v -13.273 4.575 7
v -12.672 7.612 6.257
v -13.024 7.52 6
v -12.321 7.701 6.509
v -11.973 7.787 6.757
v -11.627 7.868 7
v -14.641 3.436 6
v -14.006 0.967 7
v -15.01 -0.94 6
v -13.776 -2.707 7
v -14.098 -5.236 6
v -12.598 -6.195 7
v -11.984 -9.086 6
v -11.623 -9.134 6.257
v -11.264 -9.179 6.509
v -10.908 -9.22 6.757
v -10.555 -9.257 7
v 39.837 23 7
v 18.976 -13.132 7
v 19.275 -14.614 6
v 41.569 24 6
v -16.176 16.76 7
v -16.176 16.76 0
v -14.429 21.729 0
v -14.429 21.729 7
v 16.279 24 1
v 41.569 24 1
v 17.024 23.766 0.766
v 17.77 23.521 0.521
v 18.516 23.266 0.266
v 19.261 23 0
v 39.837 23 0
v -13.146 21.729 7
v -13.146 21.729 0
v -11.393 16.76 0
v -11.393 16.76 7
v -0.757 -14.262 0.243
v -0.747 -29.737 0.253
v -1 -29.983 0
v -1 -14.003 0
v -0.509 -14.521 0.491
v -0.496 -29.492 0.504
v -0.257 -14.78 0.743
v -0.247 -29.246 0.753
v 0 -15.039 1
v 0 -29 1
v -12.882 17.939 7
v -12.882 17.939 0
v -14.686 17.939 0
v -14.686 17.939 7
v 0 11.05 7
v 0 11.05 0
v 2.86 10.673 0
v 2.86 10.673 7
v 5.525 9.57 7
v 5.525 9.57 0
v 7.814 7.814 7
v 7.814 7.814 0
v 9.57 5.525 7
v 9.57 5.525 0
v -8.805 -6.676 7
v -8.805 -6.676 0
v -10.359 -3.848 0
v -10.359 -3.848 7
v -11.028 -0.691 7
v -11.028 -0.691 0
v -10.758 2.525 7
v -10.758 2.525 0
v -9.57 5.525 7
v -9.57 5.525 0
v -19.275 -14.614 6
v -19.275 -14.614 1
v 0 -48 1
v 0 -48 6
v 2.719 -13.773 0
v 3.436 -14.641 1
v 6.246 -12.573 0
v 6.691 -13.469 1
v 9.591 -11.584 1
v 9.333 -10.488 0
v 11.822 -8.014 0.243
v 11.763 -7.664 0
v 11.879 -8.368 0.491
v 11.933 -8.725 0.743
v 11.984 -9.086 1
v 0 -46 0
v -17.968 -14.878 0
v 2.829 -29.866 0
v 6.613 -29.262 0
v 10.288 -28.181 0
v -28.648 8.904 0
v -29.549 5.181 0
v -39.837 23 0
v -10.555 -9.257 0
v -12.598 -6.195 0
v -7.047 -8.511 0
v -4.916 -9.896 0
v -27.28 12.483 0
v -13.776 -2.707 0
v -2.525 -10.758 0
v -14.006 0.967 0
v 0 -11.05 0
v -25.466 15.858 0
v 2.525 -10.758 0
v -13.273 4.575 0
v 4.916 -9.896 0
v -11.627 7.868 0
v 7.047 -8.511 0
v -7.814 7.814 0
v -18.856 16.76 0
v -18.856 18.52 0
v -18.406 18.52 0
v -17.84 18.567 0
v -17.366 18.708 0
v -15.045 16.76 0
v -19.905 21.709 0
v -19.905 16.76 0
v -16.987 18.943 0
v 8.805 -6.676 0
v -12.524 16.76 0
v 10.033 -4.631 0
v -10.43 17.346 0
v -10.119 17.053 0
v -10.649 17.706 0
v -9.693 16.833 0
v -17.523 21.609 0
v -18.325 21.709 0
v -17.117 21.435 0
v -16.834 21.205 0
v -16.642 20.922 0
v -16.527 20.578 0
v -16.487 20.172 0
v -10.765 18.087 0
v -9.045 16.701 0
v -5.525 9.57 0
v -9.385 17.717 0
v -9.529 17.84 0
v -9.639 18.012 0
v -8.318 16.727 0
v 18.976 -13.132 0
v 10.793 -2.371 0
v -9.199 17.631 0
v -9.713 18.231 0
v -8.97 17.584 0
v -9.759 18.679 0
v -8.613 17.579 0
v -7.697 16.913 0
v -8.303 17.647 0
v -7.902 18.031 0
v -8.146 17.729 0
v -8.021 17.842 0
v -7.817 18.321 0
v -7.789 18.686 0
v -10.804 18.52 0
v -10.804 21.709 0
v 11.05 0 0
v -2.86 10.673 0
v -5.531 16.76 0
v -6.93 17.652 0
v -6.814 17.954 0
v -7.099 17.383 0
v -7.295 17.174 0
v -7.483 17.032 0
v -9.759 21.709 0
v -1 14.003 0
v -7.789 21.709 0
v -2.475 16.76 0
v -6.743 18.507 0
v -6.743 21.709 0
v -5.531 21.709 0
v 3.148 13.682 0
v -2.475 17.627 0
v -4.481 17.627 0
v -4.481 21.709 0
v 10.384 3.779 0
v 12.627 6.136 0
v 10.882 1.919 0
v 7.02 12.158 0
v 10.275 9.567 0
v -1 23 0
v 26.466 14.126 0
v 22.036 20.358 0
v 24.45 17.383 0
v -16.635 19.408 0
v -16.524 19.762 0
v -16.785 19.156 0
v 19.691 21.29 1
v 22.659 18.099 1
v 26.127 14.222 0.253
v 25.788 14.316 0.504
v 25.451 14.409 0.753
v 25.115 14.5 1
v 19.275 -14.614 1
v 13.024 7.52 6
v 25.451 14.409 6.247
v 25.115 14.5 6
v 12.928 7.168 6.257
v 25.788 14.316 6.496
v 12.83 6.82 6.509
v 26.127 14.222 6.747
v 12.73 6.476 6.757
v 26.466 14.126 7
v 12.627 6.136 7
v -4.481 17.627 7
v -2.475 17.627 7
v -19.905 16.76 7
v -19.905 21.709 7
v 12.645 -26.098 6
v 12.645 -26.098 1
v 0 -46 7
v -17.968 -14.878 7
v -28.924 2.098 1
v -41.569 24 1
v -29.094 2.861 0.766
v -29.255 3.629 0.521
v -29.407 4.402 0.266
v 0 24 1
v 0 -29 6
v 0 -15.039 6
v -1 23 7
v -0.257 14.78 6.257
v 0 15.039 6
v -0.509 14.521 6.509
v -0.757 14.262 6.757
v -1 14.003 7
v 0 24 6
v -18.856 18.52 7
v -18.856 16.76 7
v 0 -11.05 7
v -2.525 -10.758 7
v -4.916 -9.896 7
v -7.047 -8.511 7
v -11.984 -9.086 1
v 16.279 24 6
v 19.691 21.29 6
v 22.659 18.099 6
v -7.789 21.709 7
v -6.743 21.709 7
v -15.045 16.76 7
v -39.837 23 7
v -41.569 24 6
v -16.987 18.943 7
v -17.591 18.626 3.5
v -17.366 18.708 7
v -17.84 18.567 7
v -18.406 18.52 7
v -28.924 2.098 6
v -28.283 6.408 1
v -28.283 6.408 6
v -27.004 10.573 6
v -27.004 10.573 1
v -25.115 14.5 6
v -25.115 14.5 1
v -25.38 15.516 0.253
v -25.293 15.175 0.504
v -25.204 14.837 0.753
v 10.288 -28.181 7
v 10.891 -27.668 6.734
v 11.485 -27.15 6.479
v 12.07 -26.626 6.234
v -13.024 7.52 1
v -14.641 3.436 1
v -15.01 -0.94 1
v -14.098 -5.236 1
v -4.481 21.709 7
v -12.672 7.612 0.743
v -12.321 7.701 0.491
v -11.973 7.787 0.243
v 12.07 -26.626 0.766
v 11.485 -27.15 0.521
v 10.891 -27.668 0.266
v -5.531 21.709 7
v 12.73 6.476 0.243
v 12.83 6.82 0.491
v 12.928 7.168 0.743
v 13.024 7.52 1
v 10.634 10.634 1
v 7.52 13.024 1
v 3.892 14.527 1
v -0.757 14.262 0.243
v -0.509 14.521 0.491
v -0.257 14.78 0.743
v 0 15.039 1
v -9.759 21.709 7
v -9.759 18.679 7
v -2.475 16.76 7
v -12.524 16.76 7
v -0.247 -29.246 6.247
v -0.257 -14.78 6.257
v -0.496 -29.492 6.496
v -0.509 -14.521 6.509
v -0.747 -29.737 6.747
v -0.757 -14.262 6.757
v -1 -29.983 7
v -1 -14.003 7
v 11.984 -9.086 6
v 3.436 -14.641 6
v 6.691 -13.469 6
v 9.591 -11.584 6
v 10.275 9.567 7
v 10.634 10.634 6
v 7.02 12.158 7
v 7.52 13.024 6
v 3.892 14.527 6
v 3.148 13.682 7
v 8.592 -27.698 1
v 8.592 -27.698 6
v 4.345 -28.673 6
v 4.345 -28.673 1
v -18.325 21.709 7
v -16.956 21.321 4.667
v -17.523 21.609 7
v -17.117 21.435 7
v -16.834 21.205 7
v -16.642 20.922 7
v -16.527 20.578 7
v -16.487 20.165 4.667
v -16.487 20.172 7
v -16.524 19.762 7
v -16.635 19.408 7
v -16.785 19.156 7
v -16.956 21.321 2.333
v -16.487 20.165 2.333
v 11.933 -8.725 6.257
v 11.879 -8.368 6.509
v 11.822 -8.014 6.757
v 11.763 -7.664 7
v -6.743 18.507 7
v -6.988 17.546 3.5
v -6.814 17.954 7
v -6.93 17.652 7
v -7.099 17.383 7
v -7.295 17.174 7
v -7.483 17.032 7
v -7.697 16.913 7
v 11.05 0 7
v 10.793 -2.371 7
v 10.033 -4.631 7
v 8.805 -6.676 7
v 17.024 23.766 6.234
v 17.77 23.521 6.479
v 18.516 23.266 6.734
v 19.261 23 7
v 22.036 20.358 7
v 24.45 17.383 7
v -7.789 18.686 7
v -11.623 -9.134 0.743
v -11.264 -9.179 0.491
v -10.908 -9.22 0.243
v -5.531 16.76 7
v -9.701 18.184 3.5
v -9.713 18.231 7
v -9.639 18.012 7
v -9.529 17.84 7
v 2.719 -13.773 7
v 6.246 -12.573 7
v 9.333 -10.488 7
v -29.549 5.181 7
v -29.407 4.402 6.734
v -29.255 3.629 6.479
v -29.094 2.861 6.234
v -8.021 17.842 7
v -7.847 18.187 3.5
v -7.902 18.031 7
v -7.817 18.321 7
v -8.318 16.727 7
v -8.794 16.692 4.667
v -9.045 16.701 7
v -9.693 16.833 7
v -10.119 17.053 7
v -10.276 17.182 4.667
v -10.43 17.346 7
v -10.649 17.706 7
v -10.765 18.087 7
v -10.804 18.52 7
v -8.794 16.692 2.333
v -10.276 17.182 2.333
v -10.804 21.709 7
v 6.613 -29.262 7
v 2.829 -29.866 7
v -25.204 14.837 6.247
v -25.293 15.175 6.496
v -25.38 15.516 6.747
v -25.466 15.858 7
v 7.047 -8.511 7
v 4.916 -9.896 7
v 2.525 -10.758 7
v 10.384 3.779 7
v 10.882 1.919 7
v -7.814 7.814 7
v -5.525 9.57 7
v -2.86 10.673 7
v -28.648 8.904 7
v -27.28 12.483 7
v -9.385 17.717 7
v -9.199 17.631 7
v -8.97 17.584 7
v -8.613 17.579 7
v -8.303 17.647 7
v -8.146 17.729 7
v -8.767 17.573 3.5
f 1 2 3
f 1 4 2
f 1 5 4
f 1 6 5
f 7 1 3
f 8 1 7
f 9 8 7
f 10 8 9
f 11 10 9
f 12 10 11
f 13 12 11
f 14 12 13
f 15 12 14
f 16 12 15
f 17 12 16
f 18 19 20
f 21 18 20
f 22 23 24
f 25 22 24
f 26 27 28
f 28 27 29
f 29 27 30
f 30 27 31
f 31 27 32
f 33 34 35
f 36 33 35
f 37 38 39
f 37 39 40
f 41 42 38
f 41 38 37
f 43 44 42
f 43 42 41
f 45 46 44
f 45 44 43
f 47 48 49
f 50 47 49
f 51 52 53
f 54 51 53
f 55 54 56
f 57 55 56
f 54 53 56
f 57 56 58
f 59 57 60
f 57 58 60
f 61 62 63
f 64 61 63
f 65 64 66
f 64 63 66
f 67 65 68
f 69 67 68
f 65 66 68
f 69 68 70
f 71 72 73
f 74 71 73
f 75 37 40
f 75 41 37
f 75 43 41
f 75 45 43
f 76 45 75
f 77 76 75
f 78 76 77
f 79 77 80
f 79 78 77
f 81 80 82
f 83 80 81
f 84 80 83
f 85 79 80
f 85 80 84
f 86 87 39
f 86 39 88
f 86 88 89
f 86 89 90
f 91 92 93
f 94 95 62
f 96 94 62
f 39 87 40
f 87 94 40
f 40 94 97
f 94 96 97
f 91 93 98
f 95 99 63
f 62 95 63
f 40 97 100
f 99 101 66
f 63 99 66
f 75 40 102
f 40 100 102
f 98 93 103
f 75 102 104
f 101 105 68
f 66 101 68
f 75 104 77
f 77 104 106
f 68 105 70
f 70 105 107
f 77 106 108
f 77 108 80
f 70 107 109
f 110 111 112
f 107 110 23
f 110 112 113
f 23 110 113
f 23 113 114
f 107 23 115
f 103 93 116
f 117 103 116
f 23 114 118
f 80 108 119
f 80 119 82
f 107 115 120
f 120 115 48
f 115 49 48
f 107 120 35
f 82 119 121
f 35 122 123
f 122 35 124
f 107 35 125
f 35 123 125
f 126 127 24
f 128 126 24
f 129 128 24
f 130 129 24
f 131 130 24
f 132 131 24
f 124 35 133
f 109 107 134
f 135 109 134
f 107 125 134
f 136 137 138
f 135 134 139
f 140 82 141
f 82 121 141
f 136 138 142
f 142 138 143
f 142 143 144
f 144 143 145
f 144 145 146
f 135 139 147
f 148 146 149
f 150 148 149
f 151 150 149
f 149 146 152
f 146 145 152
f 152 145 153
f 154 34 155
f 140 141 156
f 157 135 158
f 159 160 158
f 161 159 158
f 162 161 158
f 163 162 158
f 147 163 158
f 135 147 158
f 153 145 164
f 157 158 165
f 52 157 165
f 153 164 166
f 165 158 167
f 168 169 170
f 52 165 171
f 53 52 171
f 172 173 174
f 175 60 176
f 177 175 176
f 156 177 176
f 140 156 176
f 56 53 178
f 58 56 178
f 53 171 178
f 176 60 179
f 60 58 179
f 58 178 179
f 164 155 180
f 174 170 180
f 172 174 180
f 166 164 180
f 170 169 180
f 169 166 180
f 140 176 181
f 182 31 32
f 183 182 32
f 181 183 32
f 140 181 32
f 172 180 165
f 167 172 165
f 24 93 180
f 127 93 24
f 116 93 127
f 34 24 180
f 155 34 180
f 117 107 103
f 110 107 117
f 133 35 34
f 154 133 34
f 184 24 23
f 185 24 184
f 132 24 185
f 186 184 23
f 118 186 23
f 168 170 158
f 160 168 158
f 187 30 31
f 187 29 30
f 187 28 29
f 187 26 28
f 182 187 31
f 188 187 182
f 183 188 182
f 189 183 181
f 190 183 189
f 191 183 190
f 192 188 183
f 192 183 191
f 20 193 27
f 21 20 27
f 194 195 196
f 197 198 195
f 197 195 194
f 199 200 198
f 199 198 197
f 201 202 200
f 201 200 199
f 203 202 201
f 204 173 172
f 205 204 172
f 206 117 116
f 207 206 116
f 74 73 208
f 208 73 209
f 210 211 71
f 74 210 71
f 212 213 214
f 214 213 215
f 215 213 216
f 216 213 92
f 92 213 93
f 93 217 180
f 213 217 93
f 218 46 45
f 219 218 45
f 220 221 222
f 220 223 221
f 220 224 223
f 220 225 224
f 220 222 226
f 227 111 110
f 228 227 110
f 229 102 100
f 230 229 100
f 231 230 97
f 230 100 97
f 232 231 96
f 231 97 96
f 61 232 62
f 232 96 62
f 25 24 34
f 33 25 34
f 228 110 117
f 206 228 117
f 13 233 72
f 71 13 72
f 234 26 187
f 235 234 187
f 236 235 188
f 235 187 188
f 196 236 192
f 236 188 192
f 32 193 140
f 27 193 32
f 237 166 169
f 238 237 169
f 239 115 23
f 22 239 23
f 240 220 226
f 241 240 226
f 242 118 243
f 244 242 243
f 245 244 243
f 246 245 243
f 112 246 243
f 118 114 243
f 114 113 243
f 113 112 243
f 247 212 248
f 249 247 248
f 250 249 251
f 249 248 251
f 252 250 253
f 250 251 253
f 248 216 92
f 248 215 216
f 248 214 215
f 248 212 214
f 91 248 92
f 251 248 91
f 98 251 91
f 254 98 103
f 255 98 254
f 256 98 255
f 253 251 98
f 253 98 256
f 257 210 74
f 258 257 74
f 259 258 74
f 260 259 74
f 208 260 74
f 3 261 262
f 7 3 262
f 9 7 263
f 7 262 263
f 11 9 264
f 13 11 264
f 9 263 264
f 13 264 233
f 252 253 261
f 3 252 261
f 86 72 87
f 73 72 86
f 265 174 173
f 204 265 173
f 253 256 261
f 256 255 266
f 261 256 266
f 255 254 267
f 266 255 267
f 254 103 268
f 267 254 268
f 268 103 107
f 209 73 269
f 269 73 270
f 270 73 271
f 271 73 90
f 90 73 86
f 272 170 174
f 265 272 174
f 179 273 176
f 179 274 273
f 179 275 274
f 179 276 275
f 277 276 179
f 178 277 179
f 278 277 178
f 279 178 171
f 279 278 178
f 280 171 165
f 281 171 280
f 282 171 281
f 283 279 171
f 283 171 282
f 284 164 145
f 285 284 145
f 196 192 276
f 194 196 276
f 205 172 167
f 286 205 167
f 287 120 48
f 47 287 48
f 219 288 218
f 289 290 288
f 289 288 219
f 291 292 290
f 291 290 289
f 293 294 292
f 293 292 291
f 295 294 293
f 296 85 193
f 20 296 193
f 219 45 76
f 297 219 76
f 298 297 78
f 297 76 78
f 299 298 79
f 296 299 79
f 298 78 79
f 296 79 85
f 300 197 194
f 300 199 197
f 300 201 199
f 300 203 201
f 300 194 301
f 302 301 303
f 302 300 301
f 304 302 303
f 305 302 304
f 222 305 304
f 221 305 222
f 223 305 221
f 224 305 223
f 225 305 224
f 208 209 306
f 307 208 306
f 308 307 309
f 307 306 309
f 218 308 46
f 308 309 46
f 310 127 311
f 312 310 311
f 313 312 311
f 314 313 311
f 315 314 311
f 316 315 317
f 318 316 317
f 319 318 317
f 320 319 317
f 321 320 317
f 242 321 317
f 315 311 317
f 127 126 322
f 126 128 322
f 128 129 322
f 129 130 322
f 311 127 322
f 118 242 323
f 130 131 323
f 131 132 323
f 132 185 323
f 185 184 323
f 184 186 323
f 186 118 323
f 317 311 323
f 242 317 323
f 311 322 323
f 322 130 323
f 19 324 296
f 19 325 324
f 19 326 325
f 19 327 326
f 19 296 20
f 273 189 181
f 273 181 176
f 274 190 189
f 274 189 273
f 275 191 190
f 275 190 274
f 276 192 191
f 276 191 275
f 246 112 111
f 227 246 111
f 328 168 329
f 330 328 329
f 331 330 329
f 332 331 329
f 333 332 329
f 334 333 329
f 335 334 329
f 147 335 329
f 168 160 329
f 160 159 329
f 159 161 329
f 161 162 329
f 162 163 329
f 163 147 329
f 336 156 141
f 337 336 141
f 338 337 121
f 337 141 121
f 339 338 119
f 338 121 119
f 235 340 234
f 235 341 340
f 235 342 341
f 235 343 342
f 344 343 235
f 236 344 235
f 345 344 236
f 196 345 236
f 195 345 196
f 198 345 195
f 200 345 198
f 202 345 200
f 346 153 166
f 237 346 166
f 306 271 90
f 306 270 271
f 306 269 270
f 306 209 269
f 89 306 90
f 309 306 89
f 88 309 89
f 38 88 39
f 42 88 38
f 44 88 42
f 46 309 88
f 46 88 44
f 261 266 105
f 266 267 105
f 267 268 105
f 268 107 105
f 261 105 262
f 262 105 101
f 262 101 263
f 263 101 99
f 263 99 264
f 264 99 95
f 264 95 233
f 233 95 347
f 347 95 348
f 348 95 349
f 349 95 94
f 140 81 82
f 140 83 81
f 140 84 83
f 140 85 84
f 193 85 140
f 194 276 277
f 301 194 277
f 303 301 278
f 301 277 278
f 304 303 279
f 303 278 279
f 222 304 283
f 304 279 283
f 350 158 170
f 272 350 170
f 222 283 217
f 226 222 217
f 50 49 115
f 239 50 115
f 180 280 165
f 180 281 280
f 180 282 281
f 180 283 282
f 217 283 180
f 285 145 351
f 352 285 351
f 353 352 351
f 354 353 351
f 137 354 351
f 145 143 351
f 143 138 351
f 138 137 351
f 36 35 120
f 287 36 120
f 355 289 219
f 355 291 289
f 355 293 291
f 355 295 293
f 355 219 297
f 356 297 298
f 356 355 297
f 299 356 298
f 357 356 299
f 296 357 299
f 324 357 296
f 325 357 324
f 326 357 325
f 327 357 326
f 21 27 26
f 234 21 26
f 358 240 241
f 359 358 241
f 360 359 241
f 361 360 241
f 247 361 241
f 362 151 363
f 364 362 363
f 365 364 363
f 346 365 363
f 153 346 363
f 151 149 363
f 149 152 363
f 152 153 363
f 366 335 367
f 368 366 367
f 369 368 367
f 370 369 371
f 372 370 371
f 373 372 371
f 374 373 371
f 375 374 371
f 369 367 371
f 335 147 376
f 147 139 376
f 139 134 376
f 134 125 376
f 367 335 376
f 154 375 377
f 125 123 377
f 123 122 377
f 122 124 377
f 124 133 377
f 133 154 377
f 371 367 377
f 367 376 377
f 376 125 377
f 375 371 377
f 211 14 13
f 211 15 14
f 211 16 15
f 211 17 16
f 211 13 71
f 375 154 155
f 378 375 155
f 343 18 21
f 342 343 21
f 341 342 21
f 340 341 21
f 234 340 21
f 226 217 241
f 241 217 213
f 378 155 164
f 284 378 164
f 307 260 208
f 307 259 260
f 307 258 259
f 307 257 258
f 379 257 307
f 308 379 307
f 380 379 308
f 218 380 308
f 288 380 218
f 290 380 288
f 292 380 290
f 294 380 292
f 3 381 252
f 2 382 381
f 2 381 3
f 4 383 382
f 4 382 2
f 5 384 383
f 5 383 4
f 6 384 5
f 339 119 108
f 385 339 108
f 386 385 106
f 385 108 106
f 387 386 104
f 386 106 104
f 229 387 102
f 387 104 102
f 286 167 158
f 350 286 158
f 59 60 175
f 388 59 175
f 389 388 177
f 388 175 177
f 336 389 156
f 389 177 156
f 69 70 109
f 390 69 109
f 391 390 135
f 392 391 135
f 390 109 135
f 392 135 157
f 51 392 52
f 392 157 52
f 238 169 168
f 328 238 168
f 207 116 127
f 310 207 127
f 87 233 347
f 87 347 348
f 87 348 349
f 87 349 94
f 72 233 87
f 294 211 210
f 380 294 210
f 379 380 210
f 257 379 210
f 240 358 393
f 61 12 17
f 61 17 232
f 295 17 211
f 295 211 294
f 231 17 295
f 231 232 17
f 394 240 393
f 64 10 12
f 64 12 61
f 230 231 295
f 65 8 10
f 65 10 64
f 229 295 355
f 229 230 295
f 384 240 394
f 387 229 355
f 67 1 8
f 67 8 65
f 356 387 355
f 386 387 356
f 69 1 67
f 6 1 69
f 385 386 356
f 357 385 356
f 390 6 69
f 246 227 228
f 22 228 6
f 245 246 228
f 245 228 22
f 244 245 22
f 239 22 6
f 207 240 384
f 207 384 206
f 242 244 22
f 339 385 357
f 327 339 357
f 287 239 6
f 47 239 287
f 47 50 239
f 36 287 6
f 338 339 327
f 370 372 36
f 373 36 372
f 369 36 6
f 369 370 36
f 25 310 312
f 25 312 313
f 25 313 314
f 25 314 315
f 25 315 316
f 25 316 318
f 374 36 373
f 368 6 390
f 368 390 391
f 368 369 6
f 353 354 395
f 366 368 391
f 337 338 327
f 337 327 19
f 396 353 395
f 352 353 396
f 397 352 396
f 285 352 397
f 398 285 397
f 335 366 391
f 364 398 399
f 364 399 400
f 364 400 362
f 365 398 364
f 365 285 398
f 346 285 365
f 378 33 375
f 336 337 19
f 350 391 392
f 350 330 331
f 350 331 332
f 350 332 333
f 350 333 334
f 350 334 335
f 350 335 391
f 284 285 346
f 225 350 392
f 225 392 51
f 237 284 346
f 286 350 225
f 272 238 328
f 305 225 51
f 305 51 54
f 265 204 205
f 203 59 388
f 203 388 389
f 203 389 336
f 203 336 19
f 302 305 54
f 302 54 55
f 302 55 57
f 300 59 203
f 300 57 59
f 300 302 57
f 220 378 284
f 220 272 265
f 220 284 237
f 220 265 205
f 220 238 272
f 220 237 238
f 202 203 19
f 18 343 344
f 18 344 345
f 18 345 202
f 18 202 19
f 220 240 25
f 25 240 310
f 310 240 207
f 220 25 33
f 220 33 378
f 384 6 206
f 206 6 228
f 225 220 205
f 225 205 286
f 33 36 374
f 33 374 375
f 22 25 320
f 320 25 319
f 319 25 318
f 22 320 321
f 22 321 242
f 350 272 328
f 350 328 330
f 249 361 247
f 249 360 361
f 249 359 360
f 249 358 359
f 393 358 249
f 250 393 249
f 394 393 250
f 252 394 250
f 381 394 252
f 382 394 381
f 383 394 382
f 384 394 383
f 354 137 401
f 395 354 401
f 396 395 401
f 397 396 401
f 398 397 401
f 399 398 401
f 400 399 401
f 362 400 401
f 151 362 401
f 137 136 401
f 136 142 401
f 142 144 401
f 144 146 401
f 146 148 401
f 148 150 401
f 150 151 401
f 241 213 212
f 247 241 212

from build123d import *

# Parameters (mm, degrees)
F1_DEPTH = 7
F2_SIZE  = 1
F3_SIZE  = 1


with BuildPart() as f1:
    # F0 (on Top) → F1 (new body)
    with BuildSketch(Plane.XY):
        with BuildLine():
            ThreePointArc((9.5695807118, 5.525), (10.6734803805, 2.8599504484), (11.05, 0))
            ThreePointArc((11.05, 0), (10.4737971003, -3.5216578911), (8.8052806693, -6.6760416667))
            Line((8.8052806693, -6.6760416667), (11.9840638306, -9.0861509672))
            ThreePointArc((11.9840638306, -9.0861509672), (14.2549292536, -4.7930071218), (15.0391464284, 0))
            ThreePointArc((15.0391464284, 0), (14.5266999405, 3.8924175178), (13.0242828582, 7.5195732142))
            Line((13.0242828582, 7.5195732142), (9.5695807118, 5.525))
        make_face()
        with BuildLine():
            ThreePointArc((0, 11.05), (5.525, 9.5695807118), (9.5695807118, 5.525))
            Line((9.5695807118, 5.525), (13.0242828582, 7.5195732142))
            ThreePointArc((13.0242828582, 7.5195732142), (7.5195732142, 13.0242828582), (0, 15.0391464284))
            Line((0, 15.0391464284), (0, 11.05))
        make_face()
        with BuildLine():
            Line((11.9840638306, -9.0861509672), (8.8052806693, -6.6760416667))
            ThreePointArc((8.8052806693, -6.6760416667), (4.9159047785, -9.8962811302), (0, -11.05))
            Line((0, -11.05), (0, -15.0391464284))
            ThreePointArc((0, -15.0391464284), (6.6905893025, -13.4689249786), (11.9840638306, -9.0861509672))
        make_face()
        with BuildLine():
            ThreePointArc((-9.5695807118, 5.525), (-5.525, 9.5695807118), (0, 11.05))
            Line((0, 11.05), (0, 15.0391464284))
            ThreePointArc((0, 15.0391464284), (-7.5195732142, 13.0242828582), (-13.0242828582, 7.5195732142))
            Line((-13.0242828582, 7.5195732142), (-9.5695807118, 5.525))
        make_face()
        with BuildLine():
            Line((25.1147367097, 14.5), (13.0242828582, 7.5195732142))
            ThreePointArc((13.0242828582, 7.5195732142), (14.5266999405, 3.8924175178), (15.0391464284, 0))
            ThreePointArc((15.0391464284, 0), (14.2549292536, -4.7930071218), (11.9840638306, -9.0861509672))
            Line((11.9840638306, -9.0861509672), (19.2752742891, -14.6142456014))
            Line((19.2752742891, -14.6142456014), (41.5692193817, 24))
            Line((41.5692193817, 24), (16.2788205961, 24))
            ThreePointArc((16.2788205961, 24), (21.2348568775, 19.7504646374), (25.1147367097, 14.5))
        make_face()
        with BuildLine():
            Line((0, -15.0391464284), (0, -11.05))
            ThreePointArc((0, -11.05), (-4.9159047785, -9.8962811302), (-8.8052806693, -6.6760416667))
            Line((-8.8052806693, -6.6760416667), (-11.9840638306, -9.0861509672))
            ThreePointArc((-11.9840638306, -9.0861509672), (-6.6905893025, -13.4689249786), (0, -15.0391464284))
        make_face()
        with BuildLine():
            ThreePointArc((-8.8052806693, -6.6760416667), (-11.028383251, -0.6908421443), (-9.5695807118, 5.525))
            Line((-9.5695807118, 5.525), (-13.0242828582, 7.5195732142))
            ThreePointArc((-13.0242828582, 7.5195732142), (-15.0097258444, -0.9402421871), (-11.9840638306, -9.0861509672))
            Line((-11.9840638306, -9.0861509672), (-8.8052806693, -6.6760416667))
        make_face()
        with BuildLine():
            ThreePointArc((-13.0242828582, 7.5195732142), (-7.5195732142, 13.0242828582), (0, 15.0391464284))
            Line((0, 15.0391464284), (0, 24))
            Line((0, 24), (-41.5692193817, 24))
            Line((-41.5692193817, 24), (-28.9240199889, 2.0978721799))
            ThreePointArc((-28.9240199889, 2.0978721799), (-27.7218325513, 8.514693183), (-25.1147367097, 14.5))
            Line((-25.1147367097, 14.5), (-13.0242828582, 7.5195732142))
        make_face()
        with BuildLine():
            add(Edge.make_bspline(
                [(-16.9558289563, 21.3208617303), (-16.4874368687, 20.9331522104), (-16.4874368687, 20.165314083)],
                knots=[0, 0, 0, 1, 1, 1], degree=2))
            add(Edge.make_bspline(
                [(-16.4874368687, 20.165314083), (-16.4874368687, 19.3660693185), (-16.9866940996, 18.9431627053)],
                knots=[0, 0, 0, 1, 1, 1], degree=2))
            add(Edge.make_bspline(
                [(-16.9866940996, 18.9431627053), (-17.4859513306, 18.5202560921), (-18.4064906935, 18.5202560921)],
                knots=[0, 0, 0, 1, 1, 1], degree=2))
            Line((-18.4064906935, 18.5202560921), (-18.8559305, 18.5202560921))
            Line((-18.8559305, 18.5202560921), (-18.8559305, 16.7604014277))
            Line((-18.8559305, 16.7604014277), (-19.9053453737, 16.7604014277))
            Line((-19.9053453737, 16.7604014277), (-19.9053453737, 21.7085712502))
            Line((-19.9053453737, 21.7085712502), (-18.325266632, 21.7085712502))
            add(Edge.make_bspline(
                [(-18.325266632, 21.7085712502), (-17.4242210439, 21.7085712502), (-16.9558289563, 21.3208617303)],
                knots=[0, 0, 0, 1, 1, 1], degree=2))
        make_face(mode=Mode.SUBTRACT)
        Polygon((-11.3930637356, 16.7604014277), (-12.5237026708, 16.7604014277), (-12.8821715286, 17.9386918123), (-14.6864286799, 17.9386918123), (-15.0448975376, 16.7604014277), (-16.1755364728, 16.7604014277), (-14.4286776582, 21.7291480124), (-13.1464204751, 21.7291480124), align=None, mode=Mode.SUBTRACT)
        with BuildLine():
            Line((-7.788881383, 21.7085712502), (-6.7427154718, 21.7085712502))
            Line((-6.7427154718, 21.7085712502), (-6.7427154718, 18.5072602423))
            add(Edge.make_bspline(
                [(-6.7427154718, 18.5072602423), (-6.7427154718, 17.958185587), (-6.9880121373, 17.5455673549)],
                knots=[0, 0, 0, 1, 1, 1], degree=2))
            add(Edge.make_bspline(
                [(-6.9880121373, 17.5455673549), (-7.2333088028, 17.1329491228), (-7.6973689405, 16.9125611695)],
                knots=[0, 0, 0, 1, 1, 1], degree=2))
            add(Edge.make_bspline(
                [(-7.6973689405, 16.9125611695), (-8.1614290781, 16.6921732161), (-8.7938937698, 16.6921732161)],
                knots=[0, 0, 0, 1, 1, 1], degree=2))
            add(Edge.make_bspline(
                [(-8.7938937698, 16.6921732161), (-9.7480057448, 16.6921732161), (-10.2759621441, 17.1816835597)],
                knots=[0, 0, 0, 1, 1, 1], degree=2))
            add(Edge.make_bspline(
                [(-10.2759621441, 17.1816835597), (-10.8039185434, 17.6711939033), (-10.8039185434, 18.5202560921)],
                knots=[0, 0, 0, 1, 1, 1], degree=2))
            Line((-10.8039185434, 18.5202560921), (-10.8039185434, 21.7085712502))
            Line((-10.8039185434, 21.7085712502), (-9.7588356196, 21.7085712502))
            Line((-9.7588356196, 21.7085712502), (-9.7588356196, 18.6794552525))
            add(Edge.make_bspline(
                [(-9.7588356196, 18.6794552525), (-9.7588356196, 18.10763786), (-9.5287007789, 17.8401399511)],
                knots=[0, 0, 0, 1, 1, 1], degree=2))
            add(Edge.make_bspline(
                [(-9.5287007789, 17.8401399511), (-9.2985659382, 17.5726420421), (-8.7668190827, 17.5726420421)],
                knots=[0, 0, 0, 1, 1, 1], degree=2))
            add(Edge.make_bspline(
                [(-8.7668190827, 17.5726420421), (-8.2524000269, 17.5726420421), (-8.020640705, 17.8417644323)],
                knots=[0, 0, 0, 1, 1, 1], degree=2))
            add(Edge.make_bspline(
                [(-8.020640705, 17.8417644323), (-7.788881383, 18.1108868225), (-7.788881383, 18.6859531774)],
                knots=[0, 0, 0, 1, 1, 1], degree=2))
            Line((-7.788881383, 18.6859531774), (-7.788881383, 21.7085712502))
        make_face(mode=Mode.SUBTRACT)
        Polygon((-2.4746617904, 16.7604014277), (-5.5308524752, 16.7604014277), (-5.5308524752, 21.7085712502), (-4.4814376015, 21.7085712502), (-4.4814376015, 17.6267914164), (-2.4746617904, 17.6267914164), align=None, mode=Mode.SUBTRACT)
        with BuildLine():
            Line((0, -29), (0, -15.0391464284))
            ThreePointArc((0, -15.0391464284), (-6.6905893025, -13.4689249786), (-11.9840638306, -9.0861509672))
            Line((-11.9840638306, -9.0861509672), (-19.2752742891, -14.6142456014))
            Line((-19.2752742891, -14.6142456014), (0, -48))
            Line((0, -48), (12.6451993928, -26.0978721799))
            ThreePointArc((12.6451993928, -26.0978721799), (6.4869756738, -28.2651578203), (0, -29))
        make_face()
    extrude(amount=F1_DEPTH)

    # F2
    f2_edges = [f1.edges().sort_by_distance(p)[0] for p in [
        (-20.78461, 24, 7),
        (-35.24662, 13.048936, 7),
        (-19.06951, 11.009787, 7),
        (-15.009726, -0.940242, 7),
        (-27.721833, 8.514693, 7),
        (-15.629669, -11.850198, 7),
        (-9.637637, -31.307123, 7),
        (6.3226, -37.048936, 7),
        (6.690589, -13.468925, 7),
        (0, -22.019573, 7),
        (6.486976, -28.265158, 7),
        (15.629669, -11.850198, 7),
        (30.422247, 4.692877, 7),
        (28.92402, 24, 7),
        (21.234857, 19.750465, 7),
        (19.06951, 11.009787, 7),
        (7.519573, 13.024283, 7),
        (0, 19.519573, 7),
    ]]
    chamfer(f2_edges, length=F2_SIZE)

    # F3
    f3_edges = [f1.edges().sort_by_distance(p)[0] for p in [
        (-9.637637, -31.307123, 0),
        (6.3226, -37.048936, 0),
        (0, -22.019573, 0),
        (6.486976, -28.265158, 0),
        (6.690589, -13.468925, 0),
        (15.629669, -11.850198, 0),
        (30.422247, 4.692877, 0),
        (28.92402, 24, 0),
        (21.234857, 19.750465, 0),
        (19.06951, 11.009787, 0),
        (7.519573, 13.024283, 0),
        (0, 19.519573, 0),
        (-20.78461, 24, 0),
        (-35.24662, 13.048936, 0),
        (-27.721833, 8.514693, 0),
        (-19.06951, 11.009787, 0),
        (-15.009726, -0.940242, 0),
        (-15.629669, -11.850198, 0),
    ]]
    chamfer(f3_edges, length=F3_SIZE)


solid = f1.part
